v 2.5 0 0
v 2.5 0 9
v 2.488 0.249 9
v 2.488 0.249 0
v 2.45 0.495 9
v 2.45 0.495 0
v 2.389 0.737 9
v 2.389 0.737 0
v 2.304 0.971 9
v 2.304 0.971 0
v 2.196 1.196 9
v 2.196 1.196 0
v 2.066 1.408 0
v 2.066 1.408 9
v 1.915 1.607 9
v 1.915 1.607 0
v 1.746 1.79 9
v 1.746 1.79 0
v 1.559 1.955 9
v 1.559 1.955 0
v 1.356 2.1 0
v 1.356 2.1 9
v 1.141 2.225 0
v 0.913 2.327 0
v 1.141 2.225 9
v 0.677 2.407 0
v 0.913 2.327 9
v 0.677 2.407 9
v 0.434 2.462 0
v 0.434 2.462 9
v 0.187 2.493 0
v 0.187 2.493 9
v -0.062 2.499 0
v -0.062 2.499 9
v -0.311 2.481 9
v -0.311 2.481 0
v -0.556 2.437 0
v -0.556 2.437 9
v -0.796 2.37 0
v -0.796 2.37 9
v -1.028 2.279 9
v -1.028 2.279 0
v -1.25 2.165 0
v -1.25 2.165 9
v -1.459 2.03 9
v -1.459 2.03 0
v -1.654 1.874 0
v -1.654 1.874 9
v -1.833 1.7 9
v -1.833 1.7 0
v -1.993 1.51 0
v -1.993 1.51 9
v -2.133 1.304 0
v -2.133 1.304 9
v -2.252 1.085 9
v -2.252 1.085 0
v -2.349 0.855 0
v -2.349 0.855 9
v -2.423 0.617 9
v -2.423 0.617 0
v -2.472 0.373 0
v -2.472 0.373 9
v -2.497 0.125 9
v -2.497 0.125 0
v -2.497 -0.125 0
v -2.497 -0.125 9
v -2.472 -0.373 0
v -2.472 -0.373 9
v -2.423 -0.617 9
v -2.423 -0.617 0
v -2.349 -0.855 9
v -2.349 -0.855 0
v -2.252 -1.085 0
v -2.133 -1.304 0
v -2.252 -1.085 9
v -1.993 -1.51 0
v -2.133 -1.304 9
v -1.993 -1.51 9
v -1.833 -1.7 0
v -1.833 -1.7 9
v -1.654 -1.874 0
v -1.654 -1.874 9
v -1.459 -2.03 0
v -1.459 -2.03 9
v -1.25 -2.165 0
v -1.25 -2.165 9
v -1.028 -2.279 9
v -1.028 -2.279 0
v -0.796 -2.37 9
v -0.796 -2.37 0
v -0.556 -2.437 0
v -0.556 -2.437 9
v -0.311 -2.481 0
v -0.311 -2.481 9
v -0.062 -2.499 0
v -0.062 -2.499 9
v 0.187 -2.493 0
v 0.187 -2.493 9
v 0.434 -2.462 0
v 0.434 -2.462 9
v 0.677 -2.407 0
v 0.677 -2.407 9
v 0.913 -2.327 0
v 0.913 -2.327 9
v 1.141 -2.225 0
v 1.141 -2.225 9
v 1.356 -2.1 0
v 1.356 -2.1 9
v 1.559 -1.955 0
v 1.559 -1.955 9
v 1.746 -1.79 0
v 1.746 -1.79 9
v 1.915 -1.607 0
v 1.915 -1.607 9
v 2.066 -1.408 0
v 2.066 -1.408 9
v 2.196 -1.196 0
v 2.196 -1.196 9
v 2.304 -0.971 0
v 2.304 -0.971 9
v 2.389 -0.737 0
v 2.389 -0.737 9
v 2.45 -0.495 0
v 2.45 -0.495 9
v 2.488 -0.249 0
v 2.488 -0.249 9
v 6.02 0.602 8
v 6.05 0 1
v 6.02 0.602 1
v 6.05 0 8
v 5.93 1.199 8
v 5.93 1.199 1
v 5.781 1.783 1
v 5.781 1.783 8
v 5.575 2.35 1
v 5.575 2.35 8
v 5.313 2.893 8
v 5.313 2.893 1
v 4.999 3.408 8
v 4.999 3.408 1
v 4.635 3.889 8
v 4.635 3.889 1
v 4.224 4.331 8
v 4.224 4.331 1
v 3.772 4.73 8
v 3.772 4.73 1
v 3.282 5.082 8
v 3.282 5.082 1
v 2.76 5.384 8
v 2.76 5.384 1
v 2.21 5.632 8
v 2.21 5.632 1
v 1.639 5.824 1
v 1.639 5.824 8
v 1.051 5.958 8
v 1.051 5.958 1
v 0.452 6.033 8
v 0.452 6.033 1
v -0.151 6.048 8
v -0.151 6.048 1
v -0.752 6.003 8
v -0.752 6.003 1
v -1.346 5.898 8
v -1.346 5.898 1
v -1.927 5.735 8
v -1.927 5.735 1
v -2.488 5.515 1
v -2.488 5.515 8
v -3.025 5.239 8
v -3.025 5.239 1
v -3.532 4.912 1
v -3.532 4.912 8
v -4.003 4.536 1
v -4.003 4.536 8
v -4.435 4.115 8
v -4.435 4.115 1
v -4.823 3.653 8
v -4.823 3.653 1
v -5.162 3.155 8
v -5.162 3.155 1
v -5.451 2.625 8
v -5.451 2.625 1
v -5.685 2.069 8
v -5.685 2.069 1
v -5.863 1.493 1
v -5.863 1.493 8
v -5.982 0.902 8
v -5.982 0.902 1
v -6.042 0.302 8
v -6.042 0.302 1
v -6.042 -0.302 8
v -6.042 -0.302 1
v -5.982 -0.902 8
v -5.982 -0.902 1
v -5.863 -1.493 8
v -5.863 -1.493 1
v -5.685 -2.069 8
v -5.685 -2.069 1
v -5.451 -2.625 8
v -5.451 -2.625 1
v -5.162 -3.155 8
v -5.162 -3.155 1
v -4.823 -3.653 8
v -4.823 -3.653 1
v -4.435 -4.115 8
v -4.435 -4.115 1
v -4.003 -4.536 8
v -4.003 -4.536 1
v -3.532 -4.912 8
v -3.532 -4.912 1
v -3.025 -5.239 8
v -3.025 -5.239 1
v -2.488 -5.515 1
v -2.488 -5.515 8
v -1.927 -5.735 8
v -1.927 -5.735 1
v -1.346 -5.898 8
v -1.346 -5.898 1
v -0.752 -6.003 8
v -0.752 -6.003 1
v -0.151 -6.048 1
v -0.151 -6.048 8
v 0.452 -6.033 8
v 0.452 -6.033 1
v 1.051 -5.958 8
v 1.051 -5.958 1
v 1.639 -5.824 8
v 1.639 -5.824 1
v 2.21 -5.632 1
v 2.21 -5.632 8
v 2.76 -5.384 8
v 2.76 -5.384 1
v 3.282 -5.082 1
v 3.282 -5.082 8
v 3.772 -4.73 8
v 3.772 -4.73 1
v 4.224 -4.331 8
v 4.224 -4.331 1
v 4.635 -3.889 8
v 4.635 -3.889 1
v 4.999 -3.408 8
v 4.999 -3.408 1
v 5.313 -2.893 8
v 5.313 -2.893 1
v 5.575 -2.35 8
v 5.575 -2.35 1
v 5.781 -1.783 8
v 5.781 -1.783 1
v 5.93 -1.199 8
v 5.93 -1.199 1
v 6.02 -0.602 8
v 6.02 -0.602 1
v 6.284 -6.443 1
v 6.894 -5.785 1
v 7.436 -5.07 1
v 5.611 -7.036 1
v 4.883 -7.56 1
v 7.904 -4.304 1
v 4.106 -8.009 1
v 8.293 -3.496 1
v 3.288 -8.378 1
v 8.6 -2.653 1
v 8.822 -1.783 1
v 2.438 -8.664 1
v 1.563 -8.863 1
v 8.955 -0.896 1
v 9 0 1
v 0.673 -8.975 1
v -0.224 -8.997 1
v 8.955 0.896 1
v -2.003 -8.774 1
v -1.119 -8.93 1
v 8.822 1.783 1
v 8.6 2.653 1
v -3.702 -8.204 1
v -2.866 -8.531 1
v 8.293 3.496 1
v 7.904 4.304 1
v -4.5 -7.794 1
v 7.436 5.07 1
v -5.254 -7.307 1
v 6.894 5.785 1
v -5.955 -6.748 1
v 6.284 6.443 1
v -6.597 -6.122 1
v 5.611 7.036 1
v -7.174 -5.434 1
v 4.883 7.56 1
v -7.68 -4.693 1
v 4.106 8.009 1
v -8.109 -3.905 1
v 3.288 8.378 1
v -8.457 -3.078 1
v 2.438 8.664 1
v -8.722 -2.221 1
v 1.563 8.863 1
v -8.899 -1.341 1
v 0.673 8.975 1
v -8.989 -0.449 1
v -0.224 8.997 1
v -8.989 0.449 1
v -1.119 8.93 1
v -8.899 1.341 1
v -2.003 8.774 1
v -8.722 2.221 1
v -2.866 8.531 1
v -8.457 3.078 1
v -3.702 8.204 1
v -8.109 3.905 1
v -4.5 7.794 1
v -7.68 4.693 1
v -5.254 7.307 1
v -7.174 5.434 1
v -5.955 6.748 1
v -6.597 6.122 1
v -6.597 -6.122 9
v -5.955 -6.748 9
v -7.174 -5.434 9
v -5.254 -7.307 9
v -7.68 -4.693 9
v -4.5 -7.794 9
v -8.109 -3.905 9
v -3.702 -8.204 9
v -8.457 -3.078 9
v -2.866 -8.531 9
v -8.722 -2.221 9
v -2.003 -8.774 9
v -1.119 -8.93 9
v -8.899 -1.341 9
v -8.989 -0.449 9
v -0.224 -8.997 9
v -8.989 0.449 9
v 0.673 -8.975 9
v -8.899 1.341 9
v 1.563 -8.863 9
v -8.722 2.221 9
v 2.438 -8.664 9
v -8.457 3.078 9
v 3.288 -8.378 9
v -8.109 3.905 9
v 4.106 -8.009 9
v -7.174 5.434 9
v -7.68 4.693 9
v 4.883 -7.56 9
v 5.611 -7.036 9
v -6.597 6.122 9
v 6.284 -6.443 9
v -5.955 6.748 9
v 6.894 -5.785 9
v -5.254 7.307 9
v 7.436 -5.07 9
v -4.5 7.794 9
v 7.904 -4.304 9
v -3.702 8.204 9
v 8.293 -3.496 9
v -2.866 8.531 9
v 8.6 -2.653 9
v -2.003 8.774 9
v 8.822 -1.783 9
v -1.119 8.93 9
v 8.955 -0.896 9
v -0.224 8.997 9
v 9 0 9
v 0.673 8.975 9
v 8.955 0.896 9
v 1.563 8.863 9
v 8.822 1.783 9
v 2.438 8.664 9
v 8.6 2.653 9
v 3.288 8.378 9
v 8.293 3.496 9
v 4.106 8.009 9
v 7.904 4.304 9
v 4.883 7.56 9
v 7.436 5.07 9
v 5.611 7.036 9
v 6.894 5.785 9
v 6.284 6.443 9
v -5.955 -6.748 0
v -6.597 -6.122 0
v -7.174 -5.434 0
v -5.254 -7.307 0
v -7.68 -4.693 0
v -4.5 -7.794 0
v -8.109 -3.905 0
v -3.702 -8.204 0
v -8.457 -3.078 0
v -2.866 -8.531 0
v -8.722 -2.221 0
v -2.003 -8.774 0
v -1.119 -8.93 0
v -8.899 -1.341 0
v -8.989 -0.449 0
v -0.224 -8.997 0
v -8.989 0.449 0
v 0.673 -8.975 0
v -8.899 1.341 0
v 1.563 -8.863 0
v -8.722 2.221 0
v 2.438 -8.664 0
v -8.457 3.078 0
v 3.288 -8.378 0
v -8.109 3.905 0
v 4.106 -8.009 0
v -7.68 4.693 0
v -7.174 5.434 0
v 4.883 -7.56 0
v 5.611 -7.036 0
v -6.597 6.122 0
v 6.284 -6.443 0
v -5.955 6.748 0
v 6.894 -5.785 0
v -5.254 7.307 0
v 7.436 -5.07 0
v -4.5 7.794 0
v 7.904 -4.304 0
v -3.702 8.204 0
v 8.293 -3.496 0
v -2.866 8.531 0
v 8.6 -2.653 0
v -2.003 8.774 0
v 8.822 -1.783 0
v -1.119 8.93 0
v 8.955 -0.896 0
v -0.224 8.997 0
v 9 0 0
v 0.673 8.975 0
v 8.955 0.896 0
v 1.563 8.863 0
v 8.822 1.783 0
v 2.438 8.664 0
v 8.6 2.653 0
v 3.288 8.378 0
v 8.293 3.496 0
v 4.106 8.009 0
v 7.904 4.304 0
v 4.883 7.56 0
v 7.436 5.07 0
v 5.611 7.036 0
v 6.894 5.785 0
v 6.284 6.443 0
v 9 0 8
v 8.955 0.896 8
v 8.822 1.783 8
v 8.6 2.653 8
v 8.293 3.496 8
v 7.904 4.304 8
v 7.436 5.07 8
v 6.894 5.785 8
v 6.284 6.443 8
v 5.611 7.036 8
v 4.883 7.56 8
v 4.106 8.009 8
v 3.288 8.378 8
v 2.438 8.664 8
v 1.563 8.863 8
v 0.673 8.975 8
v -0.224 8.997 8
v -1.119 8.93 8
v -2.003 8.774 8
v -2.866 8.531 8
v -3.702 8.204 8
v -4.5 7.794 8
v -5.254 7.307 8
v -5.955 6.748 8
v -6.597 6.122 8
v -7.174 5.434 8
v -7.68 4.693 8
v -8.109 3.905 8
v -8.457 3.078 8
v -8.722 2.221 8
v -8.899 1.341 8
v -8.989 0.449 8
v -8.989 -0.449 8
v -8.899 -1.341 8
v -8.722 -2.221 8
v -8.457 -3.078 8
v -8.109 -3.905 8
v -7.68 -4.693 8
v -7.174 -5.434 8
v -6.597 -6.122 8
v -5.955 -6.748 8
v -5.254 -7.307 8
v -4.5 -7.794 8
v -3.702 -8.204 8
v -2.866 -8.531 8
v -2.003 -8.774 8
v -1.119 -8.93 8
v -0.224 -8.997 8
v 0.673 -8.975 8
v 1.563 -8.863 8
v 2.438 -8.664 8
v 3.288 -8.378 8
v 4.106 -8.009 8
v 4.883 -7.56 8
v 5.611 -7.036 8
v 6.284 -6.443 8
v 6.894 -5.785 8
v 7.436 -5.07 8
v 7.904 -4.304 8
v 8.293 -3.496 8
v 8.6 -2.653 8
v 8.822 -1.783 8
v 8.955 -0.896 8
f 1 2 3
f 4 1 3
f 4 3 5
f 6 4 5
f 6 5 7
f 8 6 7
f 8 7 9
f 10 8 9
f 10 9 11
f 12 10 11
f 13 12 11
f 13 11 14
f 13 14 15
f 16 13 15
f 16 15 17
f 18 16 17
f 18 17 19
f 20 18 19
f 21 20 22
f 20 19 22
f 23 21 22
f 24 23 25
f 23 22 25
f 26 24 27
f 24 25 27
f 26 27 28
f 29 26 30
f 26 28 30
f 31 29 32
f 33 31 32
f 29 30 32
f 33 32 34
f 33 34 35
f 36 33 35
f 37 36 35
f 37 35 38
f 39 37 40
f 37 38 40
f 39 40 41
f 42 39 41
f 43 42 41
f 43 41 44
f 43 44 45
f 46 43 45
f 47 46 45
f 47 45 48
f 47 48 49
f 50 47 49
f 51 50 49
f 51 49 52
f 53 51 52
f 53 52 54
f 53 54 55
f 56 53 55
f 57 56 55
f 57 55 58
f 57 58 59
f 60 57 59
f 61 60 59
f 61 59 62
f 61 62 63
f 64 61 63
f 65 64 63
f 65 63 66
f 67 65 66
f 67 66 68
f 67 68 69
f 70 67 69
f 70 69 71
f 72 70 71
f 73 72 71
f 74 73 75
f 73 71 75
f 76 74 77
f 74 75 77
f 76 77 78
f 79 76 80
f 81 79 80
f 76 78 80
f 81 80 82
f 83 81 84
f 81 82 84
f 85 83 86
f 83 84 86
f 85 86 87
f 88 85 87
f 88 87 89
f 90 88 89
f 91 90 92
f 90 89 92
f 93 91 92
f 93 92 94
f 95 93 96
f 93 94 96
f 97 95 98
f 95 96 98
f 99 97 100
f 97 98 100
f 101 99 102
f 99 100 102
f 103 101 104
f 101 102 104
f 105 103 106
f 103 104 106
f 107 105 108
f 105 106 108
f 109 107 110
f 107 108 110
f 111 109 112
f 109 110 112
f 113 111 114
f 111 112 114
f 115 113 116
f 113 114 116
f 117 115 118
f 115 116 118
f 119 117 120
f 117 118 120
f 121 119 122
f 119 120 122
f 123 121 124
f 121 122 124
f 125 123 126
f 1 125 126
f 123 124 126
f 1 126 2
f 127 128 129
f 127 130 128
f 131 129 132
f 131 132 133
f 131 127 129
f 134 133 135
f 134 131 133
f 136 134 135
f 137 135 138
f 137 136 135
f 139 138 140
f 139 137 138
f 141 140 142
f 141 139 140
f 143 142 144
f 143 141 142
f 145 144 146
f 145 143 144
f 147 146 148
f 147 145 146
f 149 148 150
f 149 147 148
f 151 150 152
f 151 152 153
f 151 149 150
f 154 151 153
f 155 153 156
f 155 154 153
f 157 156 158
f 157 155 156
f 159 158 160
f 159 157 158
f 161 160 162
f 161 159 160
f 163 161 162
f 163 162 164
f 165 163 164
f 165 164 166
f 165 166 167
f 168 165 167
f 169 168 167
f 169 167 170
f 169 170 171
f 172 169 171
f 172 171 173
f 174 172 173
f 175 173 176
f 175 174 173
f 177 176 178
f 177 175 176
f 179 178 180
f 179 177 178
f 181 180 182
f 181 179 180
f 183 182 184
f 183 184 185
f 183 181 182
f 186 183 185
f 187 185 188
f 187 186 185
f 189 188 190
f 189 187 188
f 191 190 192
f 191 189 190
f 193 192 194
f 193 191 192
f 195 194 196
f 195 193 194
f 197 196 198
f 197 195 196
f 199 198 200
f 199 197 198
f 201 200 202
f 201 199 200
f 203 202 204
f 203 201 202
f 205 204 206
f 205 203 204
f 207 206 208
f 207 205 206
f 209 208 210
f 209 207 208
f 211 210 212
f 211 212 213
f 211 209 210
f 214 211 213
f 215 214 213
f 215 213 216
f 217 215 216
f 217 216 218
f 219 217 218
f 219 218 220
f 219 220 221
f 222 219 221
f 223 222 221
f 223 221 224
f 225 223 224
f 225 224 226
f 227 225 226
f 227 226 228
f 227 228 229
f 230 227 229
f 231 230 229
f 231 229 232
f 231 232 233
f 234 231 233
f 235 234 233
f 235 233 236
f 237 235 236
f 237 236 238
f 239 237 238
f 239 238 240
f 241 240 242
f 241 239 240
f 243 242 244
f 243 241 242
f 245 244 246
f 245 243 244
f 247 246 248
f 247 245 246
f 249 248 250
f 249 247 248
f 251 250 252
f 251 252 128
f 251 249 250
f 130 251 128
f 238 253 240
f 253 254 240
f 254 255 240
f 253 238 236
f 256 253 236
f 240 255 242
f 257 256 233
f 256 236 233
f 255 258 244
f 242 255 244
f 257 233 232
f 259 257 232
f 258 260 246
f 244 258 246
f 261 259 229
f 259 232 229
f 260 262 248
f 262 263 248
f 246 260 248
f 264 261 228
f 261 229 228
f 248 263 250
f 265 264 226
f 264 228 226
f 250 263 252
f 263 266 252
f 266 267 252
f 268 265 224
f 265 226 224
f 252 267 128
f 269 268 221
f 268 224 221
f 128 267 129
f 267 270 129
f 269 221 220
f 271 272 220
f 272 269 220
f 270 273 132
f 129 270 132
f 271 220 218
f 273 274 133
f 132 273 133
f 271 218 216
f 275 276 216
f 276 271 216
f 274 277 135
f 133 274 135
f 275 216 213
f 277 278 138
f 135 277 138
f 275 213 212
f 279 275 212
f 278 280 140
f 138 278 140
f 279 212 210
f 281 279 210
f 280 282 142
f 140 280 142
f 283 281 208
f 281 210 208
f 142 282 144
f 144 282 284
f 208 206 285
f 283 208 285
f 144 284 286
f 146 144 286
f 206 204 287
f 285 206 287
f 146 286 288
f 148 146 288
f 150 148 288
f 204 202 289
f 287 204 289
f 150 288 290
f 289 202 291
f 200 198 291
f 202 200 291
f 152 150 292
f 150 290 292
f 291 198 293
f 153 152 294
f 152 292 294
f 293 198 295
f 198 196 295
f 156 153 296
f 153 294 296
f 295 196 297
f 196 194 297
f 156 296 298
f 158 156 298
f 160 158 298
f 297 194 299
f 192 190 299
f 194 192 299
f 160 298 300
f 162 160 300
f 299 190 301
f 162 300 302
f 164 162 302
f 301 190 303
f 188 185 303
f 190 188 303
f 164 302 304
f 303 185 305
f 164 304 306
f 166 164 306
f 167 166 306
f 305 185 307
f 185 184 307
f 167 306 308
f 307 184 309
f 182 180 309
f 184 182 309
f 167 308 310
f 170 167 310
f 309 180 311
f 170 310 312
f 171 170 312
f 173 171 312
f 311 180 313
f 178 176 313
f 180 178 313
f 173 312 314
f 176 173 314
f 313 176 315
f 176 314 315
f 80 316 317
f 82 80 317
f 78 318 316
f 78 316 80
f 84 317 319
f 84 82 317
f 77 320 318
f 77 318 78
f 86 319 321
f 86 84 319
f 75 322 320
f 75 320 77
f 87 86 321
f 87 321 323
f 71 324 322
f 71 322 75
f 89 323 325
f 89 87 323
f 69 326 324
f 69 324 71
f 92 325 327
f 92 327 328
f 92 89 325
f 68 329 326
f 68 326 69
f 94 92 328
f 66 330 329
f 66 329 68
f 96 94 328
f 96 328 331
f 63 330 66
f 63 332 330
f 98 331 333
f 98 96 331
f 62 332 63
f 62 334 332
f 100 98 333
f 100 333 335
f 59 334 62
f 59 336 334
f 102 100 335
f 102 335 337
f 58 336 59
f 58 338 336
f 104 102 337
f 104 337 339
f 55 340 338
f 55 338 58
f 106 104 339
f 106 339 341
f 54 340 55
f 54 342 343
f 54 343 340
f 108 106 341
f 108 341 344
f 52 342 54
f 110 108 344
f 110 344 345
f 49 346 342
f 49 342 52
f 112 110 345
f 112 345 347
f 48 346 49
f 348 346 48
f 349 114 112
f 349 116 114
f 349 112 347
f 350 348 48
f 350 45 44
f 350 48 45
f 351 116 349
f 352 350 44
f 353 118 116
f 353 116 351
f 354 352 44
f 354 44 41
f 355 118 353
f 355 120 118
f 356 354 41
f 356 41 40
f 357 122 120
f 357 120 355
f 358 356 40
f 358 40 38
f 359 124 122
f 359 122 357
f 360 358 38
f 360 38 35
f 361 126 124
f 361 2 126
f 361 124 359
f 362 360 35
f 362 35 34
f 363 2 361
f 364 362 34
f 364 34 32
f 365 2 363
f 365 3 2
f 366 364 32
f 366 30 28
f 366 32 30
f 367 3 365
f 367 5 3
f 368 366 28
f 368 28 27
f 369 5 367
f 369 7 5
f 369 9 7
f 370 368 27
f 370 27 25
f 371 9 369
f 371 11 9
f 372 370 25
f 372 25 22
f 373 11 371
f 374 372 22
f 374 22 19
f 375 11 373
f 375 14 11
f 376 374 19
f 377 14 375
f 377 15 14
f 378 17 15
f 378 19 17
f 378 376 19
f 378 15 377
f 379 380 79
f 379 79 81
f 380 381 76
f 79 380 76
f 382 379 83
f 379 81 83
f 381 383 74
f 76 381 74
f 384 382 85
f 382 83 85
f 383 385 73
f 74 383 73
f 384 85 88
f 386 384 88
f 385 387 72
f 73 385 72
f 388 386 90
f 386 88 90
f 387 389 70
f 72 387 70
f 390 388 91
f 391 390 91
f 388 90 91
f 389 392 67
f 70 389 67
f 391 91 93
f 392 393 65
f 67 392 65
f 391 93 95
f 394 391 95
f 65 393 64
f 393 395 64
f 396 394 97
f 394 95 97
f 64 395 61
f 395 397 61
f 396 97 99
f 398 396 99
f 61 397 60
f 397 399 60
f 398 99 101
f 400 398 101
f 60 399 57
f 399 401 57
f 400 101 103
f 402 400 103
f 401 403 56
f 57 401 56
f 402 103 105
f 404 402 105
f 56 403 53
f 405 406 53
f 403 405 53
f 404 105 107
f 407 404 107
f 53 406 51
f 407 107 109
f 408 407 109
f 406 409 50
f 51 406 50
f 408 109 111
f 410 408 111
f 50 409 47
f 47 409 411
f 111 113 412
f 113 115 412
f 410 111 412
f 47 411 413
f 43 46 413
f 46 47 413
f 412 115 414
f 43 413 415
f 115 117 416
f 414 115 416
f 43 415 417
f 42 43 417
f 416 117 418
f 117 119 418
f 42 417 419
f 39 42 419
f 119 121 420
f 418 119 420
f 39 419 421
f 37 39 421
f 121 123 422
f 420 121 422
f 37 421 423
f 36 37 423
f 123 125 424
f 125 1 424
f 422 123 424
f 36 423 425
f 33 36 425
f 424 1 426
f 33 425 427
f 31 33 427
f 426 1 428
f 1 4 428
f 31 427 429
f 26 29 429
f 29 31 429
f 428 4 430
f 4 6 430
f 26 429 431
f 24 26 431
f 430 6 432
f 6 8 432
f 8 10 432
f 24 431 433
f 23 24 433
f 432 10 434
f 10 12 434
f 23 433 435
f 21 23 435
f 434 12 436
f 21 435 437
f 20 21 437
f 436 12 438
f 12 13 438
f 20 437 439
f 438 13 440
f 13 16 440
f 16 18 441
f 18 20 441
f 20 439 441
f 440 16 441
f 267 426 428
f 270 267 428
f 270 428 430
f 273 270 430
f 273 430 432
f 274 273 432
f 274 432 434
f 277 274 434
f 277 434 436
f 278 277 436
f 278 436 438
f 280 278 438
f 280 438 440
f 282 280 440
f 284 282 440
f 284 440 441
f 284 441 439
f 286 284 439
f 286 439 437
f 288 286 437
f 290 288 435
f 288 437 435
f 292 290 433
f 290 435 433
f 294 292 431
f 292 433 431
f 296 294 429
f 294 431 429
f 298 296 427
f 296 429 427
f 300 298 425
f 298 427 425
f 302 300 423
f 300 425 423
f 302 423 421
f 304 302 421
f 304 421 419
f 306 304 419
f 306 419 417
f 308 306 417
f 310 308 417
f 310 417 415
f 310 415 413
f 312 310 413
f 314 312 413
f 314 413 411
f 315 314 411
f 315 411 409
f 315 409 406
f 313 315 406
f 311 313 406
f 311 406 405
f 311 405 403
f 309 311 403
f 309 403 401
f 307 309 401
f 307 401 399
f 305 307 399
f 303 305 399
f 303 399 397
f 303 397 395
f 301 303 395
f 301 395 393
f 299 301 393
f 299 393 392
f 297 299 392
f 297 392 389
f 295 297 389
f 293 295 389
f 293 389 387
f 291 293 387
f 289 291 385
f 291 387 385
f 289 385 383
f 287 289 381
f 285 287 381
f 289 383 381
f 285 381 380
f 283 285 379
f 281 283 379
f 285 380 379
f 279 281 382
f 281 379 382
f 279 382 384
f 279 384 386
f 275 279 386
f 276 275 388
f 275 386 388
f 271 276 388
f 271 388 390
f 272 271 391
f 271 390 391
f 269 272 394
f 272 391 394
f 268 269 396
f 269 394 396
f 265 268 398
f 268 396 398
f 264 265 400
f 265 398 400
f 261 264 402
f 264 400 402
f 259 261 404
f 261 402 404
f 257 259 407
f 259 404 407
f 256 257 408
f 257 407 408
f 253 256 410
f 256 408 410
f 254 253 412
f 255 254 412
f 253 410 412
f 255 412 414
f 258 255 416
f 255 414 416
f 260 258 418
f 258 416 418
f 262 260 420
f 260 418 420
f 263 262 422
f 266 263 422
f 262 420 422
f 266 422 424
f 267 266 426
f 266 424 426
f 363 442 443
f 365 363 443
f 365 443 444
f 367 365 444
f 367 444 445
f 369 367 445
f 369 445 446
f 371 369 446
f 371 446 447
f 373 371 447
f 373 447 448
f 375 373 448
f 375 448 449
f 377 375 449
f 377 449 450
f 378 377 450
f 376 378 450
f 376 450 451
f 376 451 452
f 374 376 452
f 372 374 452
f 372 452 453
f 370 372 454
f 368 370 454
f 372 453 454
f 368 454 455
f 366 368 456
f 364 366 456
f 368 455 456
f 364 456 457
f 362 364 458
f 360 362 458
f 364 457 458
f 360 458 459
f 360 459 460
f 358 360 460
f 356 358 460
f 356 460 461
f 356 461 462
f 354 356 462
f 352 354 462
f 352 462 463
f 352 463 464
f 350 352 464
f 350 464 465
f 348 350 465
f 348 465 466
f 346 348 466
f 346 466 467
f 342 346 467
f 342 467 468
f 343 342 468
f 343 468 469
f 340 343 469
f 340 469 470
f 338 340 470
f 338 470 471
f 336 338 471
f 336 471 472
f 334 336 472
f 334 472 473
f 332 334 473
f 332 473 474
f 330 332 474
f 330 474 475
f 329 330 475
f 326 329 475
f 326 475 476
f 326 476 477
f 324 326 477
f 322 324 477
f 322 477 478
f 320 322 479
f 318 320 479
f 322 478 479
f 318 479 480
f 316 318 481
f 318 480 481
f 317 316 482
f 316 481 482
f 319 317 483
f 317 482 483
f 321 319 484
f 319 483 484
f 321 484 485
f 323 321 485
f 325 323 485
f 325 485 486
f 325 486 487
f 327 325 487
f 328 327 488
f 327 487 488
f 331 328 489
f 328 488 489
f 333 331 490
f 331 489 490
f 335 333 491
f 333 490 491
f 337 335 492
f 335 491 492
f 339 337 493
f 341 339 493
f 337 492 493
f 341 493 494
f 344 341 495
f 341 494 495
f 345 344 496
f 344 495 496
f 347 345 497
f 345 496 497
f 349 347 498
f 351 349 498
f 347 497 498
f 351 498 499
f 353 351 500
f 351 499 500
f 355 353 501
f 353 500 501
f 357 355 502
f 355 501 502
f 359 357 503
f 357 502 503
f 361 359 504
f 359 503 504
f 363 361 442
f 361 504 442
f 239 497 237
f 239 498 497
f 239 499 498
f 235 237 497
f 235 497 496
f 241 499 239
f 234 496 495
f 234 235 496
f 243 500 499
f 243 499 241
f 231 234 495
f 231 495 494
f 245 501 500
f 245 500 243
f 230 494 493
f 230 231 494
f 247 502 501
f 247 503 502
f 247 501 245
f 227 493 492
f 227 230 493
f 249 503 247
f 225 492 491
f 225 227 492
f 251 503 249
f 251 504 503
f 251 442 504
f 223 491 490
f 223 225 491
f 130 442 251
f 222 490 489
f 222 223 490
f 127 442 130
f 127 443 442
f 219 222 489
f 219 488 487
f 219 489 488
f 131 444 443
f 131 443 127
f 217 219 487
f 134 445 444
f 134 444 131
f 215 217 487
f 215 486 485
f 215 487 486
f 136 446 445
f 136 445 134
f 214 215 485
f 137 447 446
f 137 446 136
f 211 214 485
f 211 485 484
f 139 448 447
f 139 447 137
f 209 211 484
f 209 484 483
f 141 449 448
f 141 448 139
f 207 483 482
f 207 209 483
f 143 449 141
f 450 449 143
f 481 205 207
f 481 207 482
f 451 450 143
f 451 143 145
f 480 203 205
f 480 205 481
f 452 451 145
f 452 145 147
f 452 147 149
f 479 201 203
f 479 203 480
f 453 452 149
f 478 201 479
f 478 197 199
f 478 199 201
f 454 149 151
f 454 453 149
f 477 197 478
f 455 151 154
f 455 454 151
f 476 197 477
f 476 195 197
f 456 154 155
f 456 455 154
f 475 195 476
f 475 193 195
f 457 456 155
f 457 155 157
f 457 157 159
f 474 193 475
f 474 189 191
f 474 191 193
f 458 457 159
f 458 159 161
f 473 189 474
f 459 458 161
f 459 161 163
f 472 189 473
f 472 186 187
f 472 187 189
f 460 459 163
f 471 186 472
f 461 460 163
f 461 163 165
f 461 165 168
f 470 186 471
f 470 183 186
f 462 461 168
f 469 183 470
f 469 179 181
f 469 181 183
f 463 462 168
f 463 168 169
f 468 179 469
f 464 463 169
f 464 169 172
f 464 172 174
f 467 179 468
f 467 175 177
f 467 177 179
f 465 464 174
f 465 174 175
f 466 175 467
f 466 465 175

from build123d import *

# Parameters (mm, degrees)
SKETCH_R     = 9
PAD_DEPTH    = 9
SKETCH001_W  = 2.95
SKETCH001_H  = 7
SKETCH002_R  = 2.5
POCKET_DEPTH = 9.001


with BuildPart() as part:
    # Sketch → Pad (new body)
    with BuildSketch(Plane.XY):
        Circle(SKETCH_R)
    extrude(amount=PAD_DEPTH)

    # Sketch001 → Groove (revolve, cut)
    with BuildSketch(Plane.XZ):
        with Locations((7.525, 4.5)):
            Rectangle(SKETCH001_W, SKETCH001_H)
    revolve(axis=Axis((0, 0, 0), (0, 0, 1)), mode=Mode.SUBTRACT)

    # Sketch002 (on Face7 of Groove) → Pocket (cut, through all)
    with BuildSketch(Plane.XY.offset(9)):
        Circle(SKETCH002_R)
    extrude(amount=-POCKET_DEPTH, mode=Mode.SUBTRACT)


solid = part.part
